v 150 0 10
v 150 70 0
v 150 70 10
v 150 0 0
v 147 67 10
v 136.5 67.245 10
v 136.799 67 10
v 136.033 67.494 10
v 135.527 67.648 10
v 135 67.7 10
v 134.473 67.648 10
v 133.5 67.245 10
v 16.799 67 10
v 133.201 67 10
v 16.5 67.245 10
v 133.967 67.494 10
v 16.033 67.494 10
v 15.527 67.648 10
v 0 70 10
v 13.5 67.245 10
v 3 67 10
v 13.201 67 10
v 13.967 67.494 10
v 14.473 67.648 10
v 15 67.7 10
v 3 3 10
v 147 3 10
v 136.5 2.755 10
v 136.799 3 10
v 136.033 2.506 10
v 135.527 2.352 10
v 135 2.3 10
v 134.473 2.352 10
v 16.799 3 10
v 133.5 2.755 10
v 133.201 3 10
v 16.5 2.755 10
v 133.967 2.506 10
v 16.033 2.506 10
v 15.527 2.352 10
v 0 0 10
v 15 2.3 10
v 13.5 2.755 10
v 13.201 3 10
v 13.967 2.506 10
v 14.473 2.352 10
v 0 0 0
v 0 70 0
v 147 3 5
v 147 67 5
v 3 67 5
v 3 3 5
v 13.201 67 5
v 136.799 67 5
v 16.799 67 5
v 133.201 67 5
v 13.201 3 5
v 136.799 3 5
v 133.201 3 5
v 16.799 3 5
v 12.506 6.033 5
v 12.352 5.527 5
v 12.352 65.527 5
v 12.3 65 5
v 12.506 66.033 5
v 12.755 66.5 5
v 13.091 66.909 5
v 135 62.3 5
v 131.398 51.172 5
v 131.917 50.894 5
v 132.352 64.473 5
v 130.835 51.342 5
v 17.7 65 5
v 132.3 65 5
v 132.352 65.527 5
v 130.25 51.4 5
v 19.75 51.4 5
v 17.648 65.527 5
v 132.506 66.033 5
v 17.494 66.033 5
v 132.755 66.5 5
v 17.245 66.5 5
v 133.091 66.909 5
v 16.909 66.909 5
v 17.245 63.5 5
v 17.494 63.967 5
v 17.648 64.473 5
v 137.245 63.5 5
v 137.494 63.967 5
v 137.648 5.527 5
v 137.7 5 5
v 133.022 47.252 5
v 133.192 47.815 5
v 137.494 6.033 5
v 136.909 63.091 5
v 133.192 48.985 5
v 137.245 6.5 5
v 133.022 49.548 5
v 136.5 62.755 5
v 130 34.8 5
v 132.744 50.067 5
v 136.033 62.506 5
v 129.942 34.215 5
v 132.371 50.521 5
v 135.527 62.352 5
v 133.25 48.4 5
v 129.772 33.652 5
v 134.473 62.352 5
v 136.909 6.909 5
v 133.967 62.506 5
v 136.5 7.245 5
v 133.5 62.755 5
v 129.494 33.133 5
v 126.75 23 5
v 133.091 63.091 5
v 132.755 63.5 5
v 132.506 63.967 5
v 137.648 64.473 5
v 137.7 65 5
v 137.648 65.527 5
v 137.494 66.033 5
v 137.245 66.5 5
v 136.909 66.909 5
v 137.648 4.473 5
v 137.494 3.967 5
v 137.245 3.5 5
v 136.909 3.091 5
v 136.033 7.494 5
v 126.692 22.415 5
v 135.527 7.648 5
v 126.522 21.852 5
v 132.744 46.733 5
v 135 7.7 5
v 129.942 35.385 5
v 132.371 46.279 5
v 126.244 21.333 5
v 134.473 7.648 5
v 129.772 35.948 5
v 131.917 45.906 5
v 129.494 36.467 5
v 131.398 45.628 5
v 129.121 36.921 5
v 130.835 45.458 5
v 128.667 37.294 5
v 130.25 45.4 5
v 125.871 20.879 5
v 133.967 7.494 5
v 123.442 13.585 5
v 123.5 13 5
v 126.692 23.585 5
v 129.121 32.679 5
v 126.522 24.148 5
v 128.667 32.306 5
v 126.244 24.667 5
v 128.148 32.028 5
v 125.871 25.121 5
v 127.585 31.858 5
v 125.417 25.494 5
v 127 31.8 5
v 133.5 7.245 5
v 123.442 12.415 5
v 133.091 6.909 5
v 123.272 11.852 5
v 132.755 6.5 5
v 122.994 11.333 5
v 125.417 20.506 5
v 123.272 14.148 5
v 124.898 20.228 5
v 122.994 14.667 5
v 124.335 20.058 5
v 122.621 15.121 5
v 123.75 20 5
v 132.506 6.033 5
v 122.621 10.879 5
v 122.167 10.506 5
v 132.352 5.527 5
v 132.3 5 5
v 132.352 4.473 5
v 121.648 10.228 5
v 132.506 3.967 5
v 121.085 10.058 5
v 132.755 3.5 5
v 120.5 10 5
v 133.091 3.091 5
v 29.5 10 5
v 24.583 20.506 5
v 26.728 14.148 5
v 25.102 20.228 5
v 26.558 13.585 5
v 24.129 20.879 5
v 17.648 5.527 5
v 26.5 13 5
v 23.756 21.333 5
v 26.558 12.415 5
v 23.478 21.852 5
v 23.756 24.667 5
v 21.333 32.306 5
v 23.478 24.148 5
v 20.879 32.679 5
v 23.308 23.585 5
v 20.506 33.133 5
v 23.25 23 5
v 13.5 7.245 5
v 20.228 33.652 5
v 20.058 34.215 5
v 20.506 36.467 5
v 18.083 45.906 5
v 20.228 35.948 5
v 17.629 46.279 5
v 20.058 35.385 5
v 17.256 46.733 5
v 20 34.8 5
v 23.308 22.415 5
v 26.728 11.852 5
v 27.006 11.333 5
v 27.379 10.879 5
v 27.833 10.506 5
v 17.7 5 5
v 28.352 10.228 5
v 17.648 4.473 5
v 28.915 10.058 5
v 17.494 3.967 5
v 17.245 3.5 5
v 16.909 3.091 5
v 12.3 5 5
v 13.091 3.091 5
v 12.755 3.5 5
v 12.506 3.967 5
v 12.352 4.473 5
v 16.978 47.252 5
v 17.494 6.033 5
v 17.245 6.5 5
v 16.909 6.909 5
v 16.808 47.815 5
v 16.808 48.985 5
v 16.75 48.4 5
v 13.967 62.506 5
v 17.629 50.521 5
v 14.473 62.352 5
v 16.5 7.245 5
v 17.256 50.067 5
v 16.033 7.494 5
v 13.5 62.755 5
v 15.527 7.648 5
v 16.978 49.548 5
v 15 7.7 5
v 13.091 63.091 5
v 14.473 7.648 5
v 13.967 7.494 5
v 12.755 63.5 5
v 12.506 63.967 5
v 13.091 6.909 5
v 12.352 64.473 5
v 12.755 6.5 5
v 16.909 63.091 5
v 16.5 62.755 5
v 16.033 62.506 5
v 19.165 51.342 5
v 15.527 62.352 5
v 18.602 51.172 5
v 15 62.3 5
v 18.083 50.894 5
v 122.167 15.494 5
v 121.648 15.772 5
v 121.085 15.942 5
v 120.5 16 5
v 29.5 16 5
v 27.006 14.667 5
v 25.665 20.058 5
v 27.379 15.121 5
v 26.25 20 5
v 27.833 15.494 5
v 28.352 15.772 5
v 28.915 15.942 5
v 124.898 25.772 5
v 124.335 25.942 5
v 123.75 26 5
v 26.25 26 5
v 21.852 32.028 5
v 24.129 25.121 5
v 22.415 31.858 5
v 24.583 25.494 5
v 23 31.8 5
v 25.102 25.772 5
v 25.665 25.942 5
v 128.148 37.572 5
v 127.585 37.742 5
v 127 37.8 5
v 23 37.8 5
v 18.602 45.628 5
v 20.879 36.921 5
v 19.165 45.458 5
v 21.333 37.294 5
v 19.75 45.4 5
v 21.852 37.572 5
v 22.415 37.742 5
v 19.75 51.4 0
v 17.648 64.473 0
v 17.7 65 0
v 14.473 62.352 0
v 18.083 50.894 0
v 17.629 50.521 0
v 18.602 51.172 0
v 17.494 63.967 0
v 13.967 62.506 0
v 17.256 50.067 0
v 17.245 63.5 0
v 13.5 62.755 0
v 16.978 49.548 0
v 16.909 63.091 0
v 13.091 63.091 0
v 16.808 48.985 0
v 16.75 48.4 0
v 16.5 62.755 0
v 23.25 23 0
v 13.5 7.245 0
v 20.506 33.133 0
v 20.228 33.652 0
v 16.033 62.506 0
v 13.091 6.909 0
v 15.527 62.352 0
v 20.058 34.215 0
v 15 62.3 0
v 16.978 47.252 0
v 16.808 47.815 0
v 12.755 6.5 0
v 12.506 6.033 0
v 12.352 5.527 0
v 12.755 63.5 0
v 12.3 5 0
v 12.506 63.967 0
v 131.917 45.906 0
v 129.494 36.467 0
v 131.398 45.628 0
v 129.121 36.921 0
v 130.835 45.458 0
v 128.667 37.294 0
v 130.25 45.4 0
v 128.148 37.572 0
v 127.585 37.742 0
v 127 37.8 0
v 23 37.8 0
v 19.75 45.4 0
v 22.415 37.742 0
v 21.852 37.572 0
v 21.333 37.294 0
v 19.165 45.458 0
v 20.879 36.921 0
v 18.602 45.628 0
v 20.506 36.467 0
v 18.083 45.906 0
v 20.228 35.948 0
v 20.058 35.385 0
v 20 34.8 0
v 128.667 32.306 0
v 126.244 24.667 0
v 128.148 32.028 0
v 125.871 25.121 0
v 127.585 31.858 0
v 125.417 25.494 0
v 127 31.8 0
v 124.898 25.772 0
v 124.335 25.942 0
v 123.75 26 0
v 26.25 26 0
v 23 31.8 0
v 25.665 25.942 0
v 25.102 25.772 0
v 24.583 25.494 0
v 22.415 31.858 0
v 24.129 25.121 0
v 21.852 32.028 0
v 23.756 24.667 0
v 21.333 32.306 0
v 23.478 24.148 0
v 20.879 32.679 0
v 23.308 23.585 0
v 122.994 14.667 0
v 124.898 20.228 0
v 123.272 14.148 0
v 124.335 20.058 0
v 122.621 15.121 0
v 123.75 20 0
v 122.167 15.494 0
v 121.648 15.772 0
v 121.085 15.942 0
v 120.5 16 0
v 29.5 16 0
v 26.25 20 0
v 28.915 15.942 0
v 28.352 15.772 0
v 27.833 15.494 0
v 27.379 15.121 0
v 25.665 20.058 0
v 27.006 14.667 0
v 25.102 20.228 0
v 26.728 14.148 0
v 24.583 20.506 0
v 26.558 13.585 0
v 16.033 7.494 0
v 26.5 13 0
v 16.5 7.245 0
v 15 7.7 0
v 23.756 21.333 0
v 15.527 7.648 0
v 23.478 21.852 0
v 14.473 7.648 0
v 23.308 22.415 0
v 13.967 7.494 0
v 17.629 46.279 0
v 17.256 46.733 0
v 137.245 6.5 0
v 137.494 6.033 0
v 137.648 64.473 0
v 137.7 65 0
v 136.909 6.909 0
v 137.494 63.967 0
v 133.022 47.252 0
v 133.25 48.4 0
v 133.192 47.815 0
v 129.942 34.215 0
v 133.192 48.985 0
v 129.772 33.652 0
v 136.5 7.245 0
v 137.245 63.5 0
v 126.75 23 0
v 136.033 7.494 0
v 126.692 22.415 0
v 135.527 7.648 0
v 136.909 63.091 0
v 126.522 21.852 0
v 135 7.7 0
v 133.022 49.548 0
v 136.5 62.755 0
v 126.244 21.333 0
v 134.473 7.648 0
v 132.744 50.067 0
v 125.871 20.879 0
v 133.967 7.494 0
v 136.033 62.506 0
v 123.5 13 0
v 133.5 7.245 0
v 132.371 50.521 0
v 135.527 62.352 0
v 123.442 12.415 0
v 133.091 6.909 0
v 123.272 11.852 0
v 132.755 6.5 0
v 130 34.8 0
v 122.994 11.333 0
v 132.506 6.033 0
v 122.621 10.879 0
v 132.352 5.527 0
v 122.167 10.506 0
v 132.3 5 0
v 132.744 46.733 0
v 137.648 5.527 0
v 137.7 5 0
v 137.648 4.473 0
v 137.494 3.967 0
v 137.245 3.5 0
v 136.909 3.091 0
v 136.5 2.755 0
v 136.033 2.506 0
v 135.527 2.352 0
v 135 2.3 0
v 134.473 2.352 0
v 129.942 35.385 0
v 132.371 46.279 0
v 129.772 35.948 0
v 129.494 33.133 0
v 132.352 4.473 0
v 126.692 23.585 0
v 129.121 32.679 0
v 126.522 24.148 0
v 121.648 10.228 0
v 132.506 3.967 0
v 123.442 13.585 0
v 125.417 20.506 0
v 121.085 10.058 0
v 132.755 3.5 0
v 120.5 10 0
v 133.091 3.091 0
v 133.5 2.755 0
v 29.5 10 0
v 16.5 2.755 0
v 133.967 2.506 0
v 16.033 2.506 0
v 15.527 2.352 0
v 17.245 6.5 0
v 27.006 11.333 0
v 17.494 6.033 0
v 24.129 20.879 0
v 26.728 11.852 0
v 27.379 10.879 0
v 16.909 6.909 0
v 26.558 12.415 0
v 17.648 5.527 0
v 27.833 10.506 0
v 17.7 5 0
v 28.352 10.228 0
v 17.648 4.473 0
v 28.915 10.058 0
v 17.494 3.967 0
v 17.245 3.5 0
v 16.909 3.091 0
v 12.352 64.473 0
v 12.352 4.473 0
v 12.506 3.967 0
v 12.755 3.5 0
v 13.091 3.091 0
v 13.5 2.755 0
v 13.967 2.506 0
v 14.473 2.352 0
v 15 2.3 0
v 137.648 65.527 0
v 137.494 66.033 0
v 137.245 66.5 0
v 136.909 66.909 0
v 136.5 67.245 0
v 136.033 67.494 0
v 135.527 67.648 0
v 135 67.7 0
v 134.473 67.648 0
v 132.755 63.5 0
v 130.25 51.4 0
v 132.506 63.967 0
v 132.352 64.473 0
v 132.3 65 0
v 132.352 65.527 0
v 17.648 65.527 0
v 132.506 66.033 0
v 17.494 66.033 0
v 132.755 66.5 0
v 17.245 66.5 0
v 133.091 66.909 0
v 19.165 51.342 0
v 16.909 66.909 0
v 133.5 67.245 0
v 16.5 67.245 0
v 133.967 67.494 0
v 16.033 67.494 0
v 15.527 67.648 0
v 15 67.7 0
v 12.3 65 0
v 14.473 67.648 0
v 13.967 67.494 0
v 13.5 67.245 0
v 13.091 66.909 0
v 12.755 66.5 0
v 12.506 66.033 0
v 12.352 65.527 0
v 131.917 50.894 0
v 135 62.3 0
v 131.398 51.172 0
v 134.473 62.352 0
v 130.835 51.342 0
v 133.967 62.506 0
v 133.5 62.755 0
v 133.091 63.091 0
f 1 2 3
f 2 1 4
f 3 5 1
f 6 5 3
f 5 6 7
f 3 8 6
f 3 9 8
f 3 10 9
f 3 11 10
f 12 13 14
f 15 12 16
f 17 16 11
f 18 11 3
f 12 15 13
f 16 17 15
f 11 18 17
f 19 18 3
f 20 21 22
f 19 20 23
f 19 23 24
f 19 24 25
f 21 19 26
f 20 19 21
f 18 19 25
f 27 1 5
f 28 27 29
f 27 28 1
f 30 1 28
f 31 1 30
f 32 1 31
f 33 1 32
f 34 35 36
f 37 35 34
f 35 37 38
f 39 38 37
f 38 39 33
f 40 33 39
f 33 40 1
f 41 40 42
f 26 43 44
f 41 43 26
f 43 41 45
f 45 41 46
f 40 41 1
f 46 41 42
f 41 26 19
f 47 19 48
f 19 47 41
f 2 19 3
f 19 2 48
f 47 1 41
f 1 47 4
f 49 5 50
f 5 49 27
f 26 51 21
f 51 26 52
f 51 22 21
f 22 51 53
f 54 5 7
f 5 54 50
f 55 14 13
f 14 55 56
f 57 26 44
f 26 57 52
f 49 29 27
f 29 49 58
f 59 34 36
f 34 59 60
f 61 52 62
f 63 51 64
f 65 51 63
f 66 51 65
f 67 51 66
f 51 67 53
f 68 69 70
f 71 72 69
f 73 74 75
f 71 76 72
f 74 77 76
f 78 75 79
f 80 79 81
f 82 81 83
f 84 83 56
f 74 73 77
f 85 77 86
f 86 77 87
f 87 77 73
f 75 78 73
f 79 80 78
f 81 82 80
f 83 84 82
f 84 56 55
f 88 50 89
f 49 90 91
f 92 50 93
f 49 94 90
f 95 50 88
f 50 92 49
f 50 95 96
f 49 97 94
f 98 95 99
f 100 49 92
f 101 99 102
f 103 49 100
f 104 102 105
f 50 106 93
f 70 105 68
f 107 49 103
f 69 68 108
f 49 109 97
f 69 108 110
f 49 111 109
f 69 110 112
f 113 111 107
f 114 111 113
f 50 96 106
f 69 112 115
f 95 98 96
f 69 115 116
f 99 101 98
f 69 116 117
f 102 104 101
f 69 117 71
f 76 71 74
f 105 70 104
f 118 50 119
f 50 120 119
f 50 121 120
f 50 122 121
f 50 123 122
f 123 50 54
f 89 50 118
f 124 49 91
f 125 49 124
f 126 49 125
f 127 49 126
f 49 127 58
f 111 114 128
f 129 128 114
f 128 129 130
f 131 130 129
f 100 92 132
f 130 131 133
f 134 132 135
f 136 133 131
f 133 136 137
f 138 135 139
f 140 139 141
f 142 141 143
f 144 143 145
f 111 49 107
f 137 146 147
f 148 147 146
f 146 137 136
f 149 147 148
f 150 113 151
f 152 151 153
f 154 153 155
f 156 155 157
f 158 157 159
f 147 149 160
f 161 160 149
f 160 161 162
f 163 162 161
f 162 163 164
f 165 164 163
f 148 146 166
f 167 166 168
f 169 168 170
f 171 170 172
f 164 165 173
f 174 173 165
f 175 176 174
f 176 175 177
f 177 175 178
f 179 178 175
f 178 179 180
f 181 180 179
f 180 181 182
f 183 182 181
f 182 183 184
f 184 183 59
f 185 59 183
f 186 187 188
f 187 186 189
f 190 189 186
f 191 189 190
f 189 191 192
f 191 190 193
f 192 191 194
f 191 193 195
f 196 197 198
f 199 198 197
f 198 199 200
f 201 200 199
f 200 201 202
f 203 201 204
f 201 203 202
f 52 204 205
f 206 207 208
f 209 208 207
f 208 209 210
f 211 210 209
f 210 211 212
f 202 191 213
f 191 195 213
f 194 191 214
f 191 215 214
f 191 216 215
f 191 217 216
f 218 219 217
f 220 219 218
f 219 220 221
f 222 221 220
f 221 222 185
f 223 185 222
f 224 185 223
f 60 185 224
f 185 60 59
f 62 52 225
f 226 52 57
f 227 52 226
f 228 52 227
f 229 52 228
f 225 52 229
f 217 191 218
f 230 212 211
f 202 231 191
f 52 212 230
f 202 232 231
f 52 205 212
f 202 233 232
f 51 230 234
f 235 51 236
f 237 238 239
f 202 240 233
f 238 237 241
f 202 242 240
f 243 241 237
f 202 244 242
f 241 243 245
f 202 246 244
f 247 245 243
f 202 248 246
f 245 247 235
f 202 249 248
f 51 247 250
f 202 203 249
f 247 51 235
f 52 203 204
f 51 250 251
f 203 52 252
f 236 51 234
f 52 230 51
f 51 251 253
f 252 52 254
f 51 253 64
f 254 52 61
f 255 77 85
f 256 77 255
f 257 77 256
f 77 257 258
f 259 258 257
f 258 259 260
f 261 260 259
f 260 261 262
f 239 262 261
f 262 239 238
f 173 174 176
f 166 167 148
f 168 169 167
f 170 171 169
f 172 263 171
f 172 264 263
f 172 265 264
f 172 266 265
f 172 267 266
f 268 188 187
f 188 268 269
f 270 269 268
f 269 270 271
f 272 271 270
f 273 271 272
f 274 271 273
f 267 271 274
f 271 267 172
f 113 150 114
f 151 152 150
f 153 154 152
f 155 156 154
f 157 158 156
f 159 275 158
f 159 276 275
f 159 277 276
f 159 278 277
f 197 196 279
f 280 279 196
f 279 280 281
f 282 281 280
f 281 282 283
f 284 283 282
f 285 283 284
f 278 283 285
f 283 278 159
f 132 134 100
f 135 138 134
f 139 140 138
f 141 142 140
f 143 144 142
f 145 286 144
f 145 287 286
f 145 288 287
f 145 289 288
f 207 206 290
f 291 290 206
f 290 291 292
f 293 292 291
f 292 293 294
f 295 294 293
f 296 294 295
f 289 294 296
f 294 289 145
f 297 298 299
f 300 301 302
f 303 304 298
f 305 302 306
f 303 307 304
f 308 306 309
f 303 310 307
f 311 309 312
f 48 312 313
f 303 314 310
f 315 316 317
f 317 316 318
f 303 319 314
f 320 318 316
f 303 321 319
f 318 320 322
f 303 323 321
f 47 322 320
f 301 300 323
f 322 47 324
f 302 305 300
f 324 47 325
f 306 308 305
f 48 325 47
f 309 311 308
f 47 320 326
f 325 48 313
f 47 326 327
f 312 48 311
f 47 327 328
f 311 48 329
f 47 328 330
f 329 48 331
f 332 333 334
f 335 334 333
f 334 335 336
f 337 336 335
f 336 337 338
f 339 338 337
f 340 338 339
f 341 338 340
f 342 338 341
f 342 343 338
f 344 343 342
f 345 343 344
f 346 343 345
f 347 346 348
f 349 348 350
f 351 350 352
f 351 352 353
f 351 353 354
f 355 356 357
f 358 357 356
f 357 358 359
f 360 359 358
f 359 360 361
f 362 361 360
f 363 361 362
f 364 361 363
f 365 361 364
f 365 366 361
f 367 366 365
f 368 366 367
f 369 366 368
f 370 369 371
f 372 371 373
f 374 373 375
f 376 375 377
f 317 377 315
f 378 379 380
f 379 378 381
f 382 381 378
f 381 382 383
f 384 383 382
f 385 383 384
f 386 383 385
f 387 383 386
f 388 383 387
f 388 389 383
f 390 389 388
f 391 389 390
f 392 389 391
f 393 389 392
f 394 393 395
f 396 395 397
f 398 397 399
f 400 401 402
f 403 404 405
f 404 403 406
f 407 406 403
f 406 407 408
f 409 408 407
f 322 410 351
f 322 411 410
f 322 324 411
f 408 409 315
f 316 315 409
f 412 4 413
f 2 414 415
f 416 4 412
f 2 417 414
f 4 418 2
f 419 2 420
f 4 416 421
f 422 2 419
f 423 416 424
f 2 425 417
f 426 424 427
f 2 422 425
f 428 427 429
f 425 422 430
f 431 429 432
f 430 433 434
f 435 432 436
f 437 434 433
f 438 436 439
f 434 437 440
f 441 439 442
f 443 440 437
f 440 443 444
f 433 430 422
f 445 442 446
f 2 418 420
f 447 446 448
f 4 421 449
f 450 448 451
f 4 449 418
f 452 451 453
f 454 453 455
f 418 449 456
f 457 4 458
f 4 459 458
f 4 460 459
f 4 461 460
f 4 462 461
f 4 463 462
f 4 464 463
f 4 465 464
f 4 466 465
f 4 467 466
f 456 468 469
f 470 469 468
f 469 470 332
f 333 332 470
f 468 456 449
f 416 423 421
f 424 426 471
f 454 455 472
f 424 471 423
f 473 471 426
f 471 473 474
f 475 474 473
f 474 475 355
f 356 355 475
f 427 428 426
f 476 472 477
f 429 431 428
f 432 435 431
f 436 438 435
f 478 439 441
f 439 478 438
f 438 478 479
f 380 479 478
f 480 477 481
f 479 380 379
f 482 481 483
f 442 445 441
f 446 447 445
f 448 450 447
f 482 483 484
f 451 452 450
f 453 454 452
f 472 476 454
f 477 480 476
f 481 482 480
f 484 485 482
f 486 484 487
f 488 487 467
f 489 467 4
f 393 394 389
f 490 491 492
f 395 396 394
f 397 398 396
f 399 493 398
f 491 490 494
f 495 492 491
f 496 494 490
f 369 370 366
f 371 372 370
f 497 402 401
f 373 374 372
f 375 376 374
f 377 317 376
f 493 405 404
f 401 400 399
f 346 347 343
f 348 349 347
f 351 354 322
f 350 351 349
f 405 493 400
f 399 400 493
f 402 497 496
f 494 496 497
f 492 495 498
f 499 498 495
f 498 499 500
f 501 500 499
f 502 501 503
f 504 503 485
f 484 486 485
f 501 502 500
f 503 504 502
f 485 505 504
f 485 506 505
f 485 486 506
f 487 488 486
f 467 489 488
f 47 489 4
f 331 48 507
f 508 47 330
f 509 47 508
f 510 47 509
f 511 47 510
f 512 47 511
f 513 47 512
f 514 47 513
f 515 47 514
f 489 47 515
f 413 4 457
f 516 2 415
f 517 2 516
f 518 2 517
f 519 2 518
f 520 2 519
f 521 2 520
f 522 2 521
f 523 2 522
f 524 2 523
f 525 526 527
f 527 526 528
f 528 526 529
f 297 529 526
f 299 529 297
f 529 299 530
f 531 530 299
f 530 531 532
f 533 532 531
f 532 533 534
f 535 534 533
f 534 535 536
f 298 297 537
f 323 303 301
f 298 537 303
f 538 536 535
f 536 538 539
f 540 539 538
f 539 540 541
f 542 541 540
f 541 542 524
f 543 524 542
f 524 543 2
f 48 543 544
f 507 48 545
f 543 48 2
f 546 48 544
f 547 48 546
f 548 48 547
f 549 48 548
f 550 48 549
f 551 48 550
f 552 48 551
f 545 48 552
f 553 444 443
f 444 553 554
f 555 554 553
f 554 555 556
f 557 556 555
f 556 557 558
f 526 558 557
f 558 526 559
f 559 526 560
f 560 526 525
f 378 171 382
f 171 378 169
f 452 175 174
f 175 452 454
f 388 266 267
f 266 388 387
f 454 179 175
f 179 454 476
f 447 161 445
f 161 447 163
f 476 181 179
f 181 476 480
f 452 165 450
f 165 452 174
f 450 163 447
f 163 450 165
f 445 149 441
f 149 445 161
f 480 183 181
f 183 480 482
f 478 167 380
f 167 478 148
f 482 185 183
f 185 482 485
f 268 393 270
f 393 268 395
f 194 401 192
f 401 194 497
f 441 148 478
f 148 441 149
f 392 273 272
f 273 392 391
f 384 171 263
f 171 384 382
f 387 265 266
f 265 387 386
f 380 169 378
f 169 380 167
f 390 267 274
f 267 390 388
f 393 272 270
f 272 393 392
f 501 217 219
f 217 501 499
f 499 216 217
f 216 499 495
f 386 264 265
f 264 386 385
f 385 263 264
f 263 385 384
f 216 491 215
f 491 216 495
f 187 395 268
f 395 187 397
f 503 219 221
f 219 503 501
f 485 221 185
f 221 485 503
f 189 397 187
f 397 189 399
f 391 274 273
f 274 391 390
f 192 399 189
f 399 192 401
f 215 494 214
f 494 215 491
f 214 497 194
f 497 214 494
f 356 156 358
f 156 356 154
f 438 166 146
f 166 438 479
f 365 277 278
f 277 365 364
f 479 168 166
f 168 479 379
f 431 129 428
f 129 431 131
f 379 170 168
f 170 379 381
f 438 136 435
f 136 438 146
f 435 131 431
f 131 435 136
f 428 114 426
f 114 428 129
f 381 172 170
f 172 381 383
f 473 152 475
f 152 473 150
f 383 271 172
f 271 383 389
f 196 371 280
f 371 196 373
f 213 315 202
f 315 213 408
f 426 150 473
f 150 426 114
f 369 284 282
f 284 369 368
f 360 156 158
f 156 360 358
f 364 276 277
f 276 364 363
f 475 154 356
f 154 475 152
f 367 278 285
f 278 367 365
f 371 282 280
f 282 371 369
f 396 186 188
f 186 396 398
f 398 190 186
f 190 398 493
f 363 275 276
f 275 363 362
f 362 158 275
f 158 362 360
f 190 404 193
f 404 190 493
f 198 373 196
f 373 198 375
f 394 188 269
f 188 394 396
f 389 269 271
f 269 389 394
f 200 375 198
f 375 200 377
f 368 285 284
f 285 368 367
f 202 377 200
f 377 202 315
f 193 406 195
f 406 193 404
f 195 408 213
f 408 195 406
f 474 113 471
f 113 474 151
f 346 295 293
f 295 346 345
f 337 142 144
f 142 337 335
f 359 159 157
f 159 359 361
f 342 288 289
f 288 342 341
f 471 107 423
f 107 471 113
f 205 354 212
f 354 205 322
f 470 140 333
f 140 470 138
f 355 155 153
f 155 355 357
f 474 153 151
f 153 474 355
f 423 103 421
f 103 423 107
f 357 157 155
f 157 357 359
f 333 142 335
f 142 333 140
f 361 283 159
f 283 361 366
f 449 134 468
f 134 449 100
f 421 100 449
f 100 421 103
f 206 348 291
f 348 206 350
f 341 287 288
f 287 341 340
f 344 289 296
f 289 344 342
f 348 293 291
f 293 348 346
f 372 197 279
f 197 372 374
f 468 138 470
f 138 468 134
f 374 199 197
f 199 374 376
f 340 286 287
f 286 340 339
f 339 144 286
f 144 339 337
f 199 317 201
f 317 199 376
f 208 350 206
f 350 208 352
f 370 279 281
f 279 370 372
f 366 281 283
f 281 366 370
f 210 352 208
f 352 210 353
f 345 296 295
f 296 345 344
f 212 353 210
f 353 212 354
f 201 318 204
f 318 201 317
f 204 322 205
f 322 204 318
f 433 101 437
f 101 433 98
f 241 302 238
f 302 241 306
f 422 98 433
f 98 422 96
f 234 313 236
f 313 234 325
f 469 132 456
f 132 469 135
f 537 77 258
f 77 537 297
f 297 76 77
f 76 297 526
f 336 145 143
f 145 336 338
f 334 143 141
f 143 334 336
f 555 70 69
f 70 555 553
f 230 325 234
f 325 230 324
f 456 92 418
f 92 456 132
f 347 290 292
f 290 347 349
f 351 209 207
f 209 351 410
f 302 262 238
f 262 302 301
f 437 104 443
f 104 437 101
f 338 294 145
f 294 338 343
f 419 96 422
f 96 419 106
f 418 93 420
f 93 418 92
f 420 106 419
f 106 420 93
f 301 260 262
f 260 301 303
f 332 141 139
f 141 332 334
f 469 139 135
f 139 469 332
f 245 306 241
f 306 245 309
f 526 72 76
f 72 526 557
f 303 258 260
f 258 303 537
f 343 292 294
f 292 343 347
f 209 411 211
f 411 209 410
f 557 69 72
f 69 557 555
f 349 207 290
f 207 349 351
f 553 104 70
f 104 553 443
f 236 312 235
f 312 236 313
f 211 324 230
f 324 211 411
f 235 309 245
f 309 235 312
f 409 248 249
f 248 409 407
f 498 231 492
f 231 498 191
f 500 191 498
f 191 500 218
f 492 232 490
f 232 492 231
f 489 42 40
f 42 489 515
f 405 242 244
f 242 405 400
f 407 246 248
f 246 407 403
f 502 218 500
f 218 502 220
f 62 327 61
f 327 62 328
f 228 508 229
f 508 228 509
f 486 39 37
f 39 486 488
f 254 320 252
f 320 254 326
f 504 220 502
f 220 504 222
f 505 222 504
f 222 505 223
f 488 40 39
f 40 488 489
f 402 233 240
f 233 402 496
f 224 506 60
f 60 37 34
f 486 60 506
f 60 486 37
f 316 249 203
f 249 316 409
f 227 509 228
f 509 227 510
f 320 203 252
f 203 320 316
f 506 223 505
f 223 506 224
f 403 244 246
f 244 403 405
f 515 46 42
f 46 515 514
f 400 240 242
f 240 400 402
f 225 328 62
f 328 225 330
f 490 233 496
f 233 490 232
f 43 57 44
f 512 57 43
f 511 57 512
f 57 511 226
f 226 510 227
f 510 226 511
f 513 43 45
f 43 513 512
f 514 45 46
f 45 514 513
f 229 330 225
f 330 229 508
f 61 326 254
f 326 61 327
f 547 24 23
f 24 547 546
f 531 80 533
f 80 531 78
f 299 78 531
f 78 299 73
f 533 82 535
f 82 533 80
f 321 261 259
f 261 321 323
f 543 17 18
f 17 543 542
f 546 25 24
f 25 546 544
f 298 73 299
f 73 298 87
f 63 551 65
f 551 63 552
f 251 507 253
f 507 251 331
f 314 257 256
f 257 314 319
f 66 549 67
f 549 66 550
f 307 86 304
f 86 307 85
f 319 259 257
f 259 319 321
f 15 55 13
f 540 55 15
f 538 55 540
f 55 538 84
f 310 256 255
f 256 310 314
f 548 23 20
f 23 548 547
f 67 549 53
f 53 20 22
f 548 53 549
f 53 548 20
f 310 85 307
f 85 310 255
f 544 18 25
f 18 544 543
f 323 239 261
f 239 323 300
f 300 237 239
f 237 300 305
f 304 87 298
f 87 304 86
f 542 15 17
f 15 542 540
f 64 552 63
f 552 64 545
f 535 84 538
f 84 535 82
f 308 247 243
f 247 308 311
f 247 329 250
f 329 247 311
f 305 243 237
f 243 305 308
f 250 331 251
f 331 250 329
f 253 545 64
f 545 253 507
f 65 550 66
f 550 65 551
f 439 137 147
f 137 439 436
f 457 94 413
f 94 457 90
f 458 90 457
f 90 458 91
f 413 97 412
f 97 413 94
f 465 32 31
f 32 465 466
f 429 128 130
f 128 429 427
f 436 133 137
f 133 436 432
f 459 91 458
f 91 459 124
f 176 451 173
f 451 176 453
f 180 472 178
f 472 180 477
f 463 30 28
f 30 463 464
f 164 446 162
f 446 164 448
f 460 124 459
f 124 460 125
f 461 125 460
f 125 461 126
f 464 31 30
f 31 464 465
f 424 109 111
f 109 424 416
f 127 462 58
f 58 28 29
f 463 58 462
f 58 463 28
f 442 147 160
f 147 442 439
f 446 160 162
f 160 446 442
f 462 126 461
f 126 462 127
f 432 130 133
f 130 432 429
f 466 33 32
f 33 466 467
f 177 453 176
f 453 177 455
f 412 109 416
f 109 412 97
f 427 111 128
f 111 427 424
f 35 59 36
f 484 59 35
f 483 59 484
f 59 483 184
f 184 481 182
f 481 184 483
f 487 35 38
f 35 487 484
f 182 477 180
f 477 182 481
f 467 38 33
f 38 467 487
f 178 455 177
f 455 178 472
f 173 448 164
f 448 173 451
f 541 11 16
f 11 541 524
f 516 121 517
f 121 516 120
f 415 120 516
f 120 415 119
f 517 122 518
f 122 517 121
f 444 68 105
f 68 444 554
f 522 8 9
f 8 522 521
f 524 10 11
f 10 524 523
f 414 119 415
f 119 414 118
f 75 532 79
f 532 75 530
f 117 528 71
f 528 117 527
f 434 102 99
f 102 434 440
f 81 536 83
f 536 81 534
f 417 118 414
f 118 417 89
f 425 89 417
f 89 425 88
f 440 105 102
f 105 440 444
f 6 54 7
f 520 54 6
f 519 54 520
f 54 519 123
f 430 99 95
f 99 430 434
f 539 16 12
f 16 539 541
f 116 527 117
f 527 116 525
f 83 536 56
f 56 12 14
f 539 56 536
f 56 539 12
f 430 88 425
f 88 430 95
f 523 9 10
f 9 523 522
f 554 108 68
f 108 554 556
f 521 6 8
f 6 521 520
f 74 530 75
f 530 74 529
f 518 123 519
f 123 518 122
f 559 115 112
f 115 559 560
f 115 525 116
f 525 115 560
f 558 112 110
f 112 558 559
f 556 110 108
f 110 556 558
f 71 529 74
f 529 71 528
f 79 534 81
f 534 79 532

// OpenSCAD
$fn = 32;

// ----------------------------------------------------------------------
// Slotted panel: 150 x 70 mm, 4 ряда of slots
// ----------------------------------------------------------------------

// --- parameters (mm) ---
panel_w = 150;            // panel width
panel_d = 70;             // panel depth
thick = 5;                // panel thickness
slot_w = 6;               // slot width
pitch0 = 10;              // first row pitch
pitch_step = 1.8;         // pitch increase per row
margin = 10;              // margin around the slot field
rows = 4;                 // number of slot rows
mount_d = 5.4;            // mounting holes
mount_x = 60;             // mounting hole offset
rim_h = 10;               // rim height
rim_t = 3;                // rim wall thickness

difference() {
  union() {
    cube([panel_w, panel_d, thick]);
    translate([0, 0, thick - 1]) difference() {
      cube([panel_w, panel_d, rim_h - thick + 1]);
      translate([rim_t, rim_t, -2.5]) cube([panel_w - 2 * rim_t, panel_d - 2 * rim_t, rim_h - thick + 6]);
    }
  }
  /* slot rows: stadium shaped cutters, 2.5 mm clear of both faces */
  /* row 0: pitch 10, length 91 */
  hull() {
    translate([29.5, 13, -2.5]) cylinder(h = thick + 5, d = slot_w);
    translate([120.5, 13, -2.5]) cylinder(h = thick + 5, d = slot_w);
  }
  /* row 1: pitch 11.8, length 97.5 */
  hull() {
    translate([26.25, 23, -2.5]) cylinder(h = thick + 5, d = slot_w);
    translate([123.75, 23, -2.5]) cylinder(h = thick + 5, d = slot_w);
  }
  /* row 2: pitch 13.6, length 104 */
  hull() {
    translate([23, 34.8, -2.5]) cylinder(h = thick + 5, d = slot_w);
    translate([127, 34.8, -2.5]) cylinder(h = thick + 5, d = slot_w);
  }
  /* row 3: pitch 15.4, length 110.5 */
  hull() {
    translate([19.75, 48.4, -2.5]) cylinder(h = thick + 5, d = slot_w);
    translate([130.25, 48.4, -2.5]) cylinder(h = thick + 5, d = slot_w);
  }
  translate([15, 5, -2.5]) cylinder(h = 15, d = mount_d);
  translate([15, 65, -2.5]) cylinder(h = 15, d = mount_d);
  translate([135, 5, -2.5]) cylinder(h = 15, d = mount_d);
  translate([135, 65, -2.5]) cylinder(h = 15, d = mount_d);
}
